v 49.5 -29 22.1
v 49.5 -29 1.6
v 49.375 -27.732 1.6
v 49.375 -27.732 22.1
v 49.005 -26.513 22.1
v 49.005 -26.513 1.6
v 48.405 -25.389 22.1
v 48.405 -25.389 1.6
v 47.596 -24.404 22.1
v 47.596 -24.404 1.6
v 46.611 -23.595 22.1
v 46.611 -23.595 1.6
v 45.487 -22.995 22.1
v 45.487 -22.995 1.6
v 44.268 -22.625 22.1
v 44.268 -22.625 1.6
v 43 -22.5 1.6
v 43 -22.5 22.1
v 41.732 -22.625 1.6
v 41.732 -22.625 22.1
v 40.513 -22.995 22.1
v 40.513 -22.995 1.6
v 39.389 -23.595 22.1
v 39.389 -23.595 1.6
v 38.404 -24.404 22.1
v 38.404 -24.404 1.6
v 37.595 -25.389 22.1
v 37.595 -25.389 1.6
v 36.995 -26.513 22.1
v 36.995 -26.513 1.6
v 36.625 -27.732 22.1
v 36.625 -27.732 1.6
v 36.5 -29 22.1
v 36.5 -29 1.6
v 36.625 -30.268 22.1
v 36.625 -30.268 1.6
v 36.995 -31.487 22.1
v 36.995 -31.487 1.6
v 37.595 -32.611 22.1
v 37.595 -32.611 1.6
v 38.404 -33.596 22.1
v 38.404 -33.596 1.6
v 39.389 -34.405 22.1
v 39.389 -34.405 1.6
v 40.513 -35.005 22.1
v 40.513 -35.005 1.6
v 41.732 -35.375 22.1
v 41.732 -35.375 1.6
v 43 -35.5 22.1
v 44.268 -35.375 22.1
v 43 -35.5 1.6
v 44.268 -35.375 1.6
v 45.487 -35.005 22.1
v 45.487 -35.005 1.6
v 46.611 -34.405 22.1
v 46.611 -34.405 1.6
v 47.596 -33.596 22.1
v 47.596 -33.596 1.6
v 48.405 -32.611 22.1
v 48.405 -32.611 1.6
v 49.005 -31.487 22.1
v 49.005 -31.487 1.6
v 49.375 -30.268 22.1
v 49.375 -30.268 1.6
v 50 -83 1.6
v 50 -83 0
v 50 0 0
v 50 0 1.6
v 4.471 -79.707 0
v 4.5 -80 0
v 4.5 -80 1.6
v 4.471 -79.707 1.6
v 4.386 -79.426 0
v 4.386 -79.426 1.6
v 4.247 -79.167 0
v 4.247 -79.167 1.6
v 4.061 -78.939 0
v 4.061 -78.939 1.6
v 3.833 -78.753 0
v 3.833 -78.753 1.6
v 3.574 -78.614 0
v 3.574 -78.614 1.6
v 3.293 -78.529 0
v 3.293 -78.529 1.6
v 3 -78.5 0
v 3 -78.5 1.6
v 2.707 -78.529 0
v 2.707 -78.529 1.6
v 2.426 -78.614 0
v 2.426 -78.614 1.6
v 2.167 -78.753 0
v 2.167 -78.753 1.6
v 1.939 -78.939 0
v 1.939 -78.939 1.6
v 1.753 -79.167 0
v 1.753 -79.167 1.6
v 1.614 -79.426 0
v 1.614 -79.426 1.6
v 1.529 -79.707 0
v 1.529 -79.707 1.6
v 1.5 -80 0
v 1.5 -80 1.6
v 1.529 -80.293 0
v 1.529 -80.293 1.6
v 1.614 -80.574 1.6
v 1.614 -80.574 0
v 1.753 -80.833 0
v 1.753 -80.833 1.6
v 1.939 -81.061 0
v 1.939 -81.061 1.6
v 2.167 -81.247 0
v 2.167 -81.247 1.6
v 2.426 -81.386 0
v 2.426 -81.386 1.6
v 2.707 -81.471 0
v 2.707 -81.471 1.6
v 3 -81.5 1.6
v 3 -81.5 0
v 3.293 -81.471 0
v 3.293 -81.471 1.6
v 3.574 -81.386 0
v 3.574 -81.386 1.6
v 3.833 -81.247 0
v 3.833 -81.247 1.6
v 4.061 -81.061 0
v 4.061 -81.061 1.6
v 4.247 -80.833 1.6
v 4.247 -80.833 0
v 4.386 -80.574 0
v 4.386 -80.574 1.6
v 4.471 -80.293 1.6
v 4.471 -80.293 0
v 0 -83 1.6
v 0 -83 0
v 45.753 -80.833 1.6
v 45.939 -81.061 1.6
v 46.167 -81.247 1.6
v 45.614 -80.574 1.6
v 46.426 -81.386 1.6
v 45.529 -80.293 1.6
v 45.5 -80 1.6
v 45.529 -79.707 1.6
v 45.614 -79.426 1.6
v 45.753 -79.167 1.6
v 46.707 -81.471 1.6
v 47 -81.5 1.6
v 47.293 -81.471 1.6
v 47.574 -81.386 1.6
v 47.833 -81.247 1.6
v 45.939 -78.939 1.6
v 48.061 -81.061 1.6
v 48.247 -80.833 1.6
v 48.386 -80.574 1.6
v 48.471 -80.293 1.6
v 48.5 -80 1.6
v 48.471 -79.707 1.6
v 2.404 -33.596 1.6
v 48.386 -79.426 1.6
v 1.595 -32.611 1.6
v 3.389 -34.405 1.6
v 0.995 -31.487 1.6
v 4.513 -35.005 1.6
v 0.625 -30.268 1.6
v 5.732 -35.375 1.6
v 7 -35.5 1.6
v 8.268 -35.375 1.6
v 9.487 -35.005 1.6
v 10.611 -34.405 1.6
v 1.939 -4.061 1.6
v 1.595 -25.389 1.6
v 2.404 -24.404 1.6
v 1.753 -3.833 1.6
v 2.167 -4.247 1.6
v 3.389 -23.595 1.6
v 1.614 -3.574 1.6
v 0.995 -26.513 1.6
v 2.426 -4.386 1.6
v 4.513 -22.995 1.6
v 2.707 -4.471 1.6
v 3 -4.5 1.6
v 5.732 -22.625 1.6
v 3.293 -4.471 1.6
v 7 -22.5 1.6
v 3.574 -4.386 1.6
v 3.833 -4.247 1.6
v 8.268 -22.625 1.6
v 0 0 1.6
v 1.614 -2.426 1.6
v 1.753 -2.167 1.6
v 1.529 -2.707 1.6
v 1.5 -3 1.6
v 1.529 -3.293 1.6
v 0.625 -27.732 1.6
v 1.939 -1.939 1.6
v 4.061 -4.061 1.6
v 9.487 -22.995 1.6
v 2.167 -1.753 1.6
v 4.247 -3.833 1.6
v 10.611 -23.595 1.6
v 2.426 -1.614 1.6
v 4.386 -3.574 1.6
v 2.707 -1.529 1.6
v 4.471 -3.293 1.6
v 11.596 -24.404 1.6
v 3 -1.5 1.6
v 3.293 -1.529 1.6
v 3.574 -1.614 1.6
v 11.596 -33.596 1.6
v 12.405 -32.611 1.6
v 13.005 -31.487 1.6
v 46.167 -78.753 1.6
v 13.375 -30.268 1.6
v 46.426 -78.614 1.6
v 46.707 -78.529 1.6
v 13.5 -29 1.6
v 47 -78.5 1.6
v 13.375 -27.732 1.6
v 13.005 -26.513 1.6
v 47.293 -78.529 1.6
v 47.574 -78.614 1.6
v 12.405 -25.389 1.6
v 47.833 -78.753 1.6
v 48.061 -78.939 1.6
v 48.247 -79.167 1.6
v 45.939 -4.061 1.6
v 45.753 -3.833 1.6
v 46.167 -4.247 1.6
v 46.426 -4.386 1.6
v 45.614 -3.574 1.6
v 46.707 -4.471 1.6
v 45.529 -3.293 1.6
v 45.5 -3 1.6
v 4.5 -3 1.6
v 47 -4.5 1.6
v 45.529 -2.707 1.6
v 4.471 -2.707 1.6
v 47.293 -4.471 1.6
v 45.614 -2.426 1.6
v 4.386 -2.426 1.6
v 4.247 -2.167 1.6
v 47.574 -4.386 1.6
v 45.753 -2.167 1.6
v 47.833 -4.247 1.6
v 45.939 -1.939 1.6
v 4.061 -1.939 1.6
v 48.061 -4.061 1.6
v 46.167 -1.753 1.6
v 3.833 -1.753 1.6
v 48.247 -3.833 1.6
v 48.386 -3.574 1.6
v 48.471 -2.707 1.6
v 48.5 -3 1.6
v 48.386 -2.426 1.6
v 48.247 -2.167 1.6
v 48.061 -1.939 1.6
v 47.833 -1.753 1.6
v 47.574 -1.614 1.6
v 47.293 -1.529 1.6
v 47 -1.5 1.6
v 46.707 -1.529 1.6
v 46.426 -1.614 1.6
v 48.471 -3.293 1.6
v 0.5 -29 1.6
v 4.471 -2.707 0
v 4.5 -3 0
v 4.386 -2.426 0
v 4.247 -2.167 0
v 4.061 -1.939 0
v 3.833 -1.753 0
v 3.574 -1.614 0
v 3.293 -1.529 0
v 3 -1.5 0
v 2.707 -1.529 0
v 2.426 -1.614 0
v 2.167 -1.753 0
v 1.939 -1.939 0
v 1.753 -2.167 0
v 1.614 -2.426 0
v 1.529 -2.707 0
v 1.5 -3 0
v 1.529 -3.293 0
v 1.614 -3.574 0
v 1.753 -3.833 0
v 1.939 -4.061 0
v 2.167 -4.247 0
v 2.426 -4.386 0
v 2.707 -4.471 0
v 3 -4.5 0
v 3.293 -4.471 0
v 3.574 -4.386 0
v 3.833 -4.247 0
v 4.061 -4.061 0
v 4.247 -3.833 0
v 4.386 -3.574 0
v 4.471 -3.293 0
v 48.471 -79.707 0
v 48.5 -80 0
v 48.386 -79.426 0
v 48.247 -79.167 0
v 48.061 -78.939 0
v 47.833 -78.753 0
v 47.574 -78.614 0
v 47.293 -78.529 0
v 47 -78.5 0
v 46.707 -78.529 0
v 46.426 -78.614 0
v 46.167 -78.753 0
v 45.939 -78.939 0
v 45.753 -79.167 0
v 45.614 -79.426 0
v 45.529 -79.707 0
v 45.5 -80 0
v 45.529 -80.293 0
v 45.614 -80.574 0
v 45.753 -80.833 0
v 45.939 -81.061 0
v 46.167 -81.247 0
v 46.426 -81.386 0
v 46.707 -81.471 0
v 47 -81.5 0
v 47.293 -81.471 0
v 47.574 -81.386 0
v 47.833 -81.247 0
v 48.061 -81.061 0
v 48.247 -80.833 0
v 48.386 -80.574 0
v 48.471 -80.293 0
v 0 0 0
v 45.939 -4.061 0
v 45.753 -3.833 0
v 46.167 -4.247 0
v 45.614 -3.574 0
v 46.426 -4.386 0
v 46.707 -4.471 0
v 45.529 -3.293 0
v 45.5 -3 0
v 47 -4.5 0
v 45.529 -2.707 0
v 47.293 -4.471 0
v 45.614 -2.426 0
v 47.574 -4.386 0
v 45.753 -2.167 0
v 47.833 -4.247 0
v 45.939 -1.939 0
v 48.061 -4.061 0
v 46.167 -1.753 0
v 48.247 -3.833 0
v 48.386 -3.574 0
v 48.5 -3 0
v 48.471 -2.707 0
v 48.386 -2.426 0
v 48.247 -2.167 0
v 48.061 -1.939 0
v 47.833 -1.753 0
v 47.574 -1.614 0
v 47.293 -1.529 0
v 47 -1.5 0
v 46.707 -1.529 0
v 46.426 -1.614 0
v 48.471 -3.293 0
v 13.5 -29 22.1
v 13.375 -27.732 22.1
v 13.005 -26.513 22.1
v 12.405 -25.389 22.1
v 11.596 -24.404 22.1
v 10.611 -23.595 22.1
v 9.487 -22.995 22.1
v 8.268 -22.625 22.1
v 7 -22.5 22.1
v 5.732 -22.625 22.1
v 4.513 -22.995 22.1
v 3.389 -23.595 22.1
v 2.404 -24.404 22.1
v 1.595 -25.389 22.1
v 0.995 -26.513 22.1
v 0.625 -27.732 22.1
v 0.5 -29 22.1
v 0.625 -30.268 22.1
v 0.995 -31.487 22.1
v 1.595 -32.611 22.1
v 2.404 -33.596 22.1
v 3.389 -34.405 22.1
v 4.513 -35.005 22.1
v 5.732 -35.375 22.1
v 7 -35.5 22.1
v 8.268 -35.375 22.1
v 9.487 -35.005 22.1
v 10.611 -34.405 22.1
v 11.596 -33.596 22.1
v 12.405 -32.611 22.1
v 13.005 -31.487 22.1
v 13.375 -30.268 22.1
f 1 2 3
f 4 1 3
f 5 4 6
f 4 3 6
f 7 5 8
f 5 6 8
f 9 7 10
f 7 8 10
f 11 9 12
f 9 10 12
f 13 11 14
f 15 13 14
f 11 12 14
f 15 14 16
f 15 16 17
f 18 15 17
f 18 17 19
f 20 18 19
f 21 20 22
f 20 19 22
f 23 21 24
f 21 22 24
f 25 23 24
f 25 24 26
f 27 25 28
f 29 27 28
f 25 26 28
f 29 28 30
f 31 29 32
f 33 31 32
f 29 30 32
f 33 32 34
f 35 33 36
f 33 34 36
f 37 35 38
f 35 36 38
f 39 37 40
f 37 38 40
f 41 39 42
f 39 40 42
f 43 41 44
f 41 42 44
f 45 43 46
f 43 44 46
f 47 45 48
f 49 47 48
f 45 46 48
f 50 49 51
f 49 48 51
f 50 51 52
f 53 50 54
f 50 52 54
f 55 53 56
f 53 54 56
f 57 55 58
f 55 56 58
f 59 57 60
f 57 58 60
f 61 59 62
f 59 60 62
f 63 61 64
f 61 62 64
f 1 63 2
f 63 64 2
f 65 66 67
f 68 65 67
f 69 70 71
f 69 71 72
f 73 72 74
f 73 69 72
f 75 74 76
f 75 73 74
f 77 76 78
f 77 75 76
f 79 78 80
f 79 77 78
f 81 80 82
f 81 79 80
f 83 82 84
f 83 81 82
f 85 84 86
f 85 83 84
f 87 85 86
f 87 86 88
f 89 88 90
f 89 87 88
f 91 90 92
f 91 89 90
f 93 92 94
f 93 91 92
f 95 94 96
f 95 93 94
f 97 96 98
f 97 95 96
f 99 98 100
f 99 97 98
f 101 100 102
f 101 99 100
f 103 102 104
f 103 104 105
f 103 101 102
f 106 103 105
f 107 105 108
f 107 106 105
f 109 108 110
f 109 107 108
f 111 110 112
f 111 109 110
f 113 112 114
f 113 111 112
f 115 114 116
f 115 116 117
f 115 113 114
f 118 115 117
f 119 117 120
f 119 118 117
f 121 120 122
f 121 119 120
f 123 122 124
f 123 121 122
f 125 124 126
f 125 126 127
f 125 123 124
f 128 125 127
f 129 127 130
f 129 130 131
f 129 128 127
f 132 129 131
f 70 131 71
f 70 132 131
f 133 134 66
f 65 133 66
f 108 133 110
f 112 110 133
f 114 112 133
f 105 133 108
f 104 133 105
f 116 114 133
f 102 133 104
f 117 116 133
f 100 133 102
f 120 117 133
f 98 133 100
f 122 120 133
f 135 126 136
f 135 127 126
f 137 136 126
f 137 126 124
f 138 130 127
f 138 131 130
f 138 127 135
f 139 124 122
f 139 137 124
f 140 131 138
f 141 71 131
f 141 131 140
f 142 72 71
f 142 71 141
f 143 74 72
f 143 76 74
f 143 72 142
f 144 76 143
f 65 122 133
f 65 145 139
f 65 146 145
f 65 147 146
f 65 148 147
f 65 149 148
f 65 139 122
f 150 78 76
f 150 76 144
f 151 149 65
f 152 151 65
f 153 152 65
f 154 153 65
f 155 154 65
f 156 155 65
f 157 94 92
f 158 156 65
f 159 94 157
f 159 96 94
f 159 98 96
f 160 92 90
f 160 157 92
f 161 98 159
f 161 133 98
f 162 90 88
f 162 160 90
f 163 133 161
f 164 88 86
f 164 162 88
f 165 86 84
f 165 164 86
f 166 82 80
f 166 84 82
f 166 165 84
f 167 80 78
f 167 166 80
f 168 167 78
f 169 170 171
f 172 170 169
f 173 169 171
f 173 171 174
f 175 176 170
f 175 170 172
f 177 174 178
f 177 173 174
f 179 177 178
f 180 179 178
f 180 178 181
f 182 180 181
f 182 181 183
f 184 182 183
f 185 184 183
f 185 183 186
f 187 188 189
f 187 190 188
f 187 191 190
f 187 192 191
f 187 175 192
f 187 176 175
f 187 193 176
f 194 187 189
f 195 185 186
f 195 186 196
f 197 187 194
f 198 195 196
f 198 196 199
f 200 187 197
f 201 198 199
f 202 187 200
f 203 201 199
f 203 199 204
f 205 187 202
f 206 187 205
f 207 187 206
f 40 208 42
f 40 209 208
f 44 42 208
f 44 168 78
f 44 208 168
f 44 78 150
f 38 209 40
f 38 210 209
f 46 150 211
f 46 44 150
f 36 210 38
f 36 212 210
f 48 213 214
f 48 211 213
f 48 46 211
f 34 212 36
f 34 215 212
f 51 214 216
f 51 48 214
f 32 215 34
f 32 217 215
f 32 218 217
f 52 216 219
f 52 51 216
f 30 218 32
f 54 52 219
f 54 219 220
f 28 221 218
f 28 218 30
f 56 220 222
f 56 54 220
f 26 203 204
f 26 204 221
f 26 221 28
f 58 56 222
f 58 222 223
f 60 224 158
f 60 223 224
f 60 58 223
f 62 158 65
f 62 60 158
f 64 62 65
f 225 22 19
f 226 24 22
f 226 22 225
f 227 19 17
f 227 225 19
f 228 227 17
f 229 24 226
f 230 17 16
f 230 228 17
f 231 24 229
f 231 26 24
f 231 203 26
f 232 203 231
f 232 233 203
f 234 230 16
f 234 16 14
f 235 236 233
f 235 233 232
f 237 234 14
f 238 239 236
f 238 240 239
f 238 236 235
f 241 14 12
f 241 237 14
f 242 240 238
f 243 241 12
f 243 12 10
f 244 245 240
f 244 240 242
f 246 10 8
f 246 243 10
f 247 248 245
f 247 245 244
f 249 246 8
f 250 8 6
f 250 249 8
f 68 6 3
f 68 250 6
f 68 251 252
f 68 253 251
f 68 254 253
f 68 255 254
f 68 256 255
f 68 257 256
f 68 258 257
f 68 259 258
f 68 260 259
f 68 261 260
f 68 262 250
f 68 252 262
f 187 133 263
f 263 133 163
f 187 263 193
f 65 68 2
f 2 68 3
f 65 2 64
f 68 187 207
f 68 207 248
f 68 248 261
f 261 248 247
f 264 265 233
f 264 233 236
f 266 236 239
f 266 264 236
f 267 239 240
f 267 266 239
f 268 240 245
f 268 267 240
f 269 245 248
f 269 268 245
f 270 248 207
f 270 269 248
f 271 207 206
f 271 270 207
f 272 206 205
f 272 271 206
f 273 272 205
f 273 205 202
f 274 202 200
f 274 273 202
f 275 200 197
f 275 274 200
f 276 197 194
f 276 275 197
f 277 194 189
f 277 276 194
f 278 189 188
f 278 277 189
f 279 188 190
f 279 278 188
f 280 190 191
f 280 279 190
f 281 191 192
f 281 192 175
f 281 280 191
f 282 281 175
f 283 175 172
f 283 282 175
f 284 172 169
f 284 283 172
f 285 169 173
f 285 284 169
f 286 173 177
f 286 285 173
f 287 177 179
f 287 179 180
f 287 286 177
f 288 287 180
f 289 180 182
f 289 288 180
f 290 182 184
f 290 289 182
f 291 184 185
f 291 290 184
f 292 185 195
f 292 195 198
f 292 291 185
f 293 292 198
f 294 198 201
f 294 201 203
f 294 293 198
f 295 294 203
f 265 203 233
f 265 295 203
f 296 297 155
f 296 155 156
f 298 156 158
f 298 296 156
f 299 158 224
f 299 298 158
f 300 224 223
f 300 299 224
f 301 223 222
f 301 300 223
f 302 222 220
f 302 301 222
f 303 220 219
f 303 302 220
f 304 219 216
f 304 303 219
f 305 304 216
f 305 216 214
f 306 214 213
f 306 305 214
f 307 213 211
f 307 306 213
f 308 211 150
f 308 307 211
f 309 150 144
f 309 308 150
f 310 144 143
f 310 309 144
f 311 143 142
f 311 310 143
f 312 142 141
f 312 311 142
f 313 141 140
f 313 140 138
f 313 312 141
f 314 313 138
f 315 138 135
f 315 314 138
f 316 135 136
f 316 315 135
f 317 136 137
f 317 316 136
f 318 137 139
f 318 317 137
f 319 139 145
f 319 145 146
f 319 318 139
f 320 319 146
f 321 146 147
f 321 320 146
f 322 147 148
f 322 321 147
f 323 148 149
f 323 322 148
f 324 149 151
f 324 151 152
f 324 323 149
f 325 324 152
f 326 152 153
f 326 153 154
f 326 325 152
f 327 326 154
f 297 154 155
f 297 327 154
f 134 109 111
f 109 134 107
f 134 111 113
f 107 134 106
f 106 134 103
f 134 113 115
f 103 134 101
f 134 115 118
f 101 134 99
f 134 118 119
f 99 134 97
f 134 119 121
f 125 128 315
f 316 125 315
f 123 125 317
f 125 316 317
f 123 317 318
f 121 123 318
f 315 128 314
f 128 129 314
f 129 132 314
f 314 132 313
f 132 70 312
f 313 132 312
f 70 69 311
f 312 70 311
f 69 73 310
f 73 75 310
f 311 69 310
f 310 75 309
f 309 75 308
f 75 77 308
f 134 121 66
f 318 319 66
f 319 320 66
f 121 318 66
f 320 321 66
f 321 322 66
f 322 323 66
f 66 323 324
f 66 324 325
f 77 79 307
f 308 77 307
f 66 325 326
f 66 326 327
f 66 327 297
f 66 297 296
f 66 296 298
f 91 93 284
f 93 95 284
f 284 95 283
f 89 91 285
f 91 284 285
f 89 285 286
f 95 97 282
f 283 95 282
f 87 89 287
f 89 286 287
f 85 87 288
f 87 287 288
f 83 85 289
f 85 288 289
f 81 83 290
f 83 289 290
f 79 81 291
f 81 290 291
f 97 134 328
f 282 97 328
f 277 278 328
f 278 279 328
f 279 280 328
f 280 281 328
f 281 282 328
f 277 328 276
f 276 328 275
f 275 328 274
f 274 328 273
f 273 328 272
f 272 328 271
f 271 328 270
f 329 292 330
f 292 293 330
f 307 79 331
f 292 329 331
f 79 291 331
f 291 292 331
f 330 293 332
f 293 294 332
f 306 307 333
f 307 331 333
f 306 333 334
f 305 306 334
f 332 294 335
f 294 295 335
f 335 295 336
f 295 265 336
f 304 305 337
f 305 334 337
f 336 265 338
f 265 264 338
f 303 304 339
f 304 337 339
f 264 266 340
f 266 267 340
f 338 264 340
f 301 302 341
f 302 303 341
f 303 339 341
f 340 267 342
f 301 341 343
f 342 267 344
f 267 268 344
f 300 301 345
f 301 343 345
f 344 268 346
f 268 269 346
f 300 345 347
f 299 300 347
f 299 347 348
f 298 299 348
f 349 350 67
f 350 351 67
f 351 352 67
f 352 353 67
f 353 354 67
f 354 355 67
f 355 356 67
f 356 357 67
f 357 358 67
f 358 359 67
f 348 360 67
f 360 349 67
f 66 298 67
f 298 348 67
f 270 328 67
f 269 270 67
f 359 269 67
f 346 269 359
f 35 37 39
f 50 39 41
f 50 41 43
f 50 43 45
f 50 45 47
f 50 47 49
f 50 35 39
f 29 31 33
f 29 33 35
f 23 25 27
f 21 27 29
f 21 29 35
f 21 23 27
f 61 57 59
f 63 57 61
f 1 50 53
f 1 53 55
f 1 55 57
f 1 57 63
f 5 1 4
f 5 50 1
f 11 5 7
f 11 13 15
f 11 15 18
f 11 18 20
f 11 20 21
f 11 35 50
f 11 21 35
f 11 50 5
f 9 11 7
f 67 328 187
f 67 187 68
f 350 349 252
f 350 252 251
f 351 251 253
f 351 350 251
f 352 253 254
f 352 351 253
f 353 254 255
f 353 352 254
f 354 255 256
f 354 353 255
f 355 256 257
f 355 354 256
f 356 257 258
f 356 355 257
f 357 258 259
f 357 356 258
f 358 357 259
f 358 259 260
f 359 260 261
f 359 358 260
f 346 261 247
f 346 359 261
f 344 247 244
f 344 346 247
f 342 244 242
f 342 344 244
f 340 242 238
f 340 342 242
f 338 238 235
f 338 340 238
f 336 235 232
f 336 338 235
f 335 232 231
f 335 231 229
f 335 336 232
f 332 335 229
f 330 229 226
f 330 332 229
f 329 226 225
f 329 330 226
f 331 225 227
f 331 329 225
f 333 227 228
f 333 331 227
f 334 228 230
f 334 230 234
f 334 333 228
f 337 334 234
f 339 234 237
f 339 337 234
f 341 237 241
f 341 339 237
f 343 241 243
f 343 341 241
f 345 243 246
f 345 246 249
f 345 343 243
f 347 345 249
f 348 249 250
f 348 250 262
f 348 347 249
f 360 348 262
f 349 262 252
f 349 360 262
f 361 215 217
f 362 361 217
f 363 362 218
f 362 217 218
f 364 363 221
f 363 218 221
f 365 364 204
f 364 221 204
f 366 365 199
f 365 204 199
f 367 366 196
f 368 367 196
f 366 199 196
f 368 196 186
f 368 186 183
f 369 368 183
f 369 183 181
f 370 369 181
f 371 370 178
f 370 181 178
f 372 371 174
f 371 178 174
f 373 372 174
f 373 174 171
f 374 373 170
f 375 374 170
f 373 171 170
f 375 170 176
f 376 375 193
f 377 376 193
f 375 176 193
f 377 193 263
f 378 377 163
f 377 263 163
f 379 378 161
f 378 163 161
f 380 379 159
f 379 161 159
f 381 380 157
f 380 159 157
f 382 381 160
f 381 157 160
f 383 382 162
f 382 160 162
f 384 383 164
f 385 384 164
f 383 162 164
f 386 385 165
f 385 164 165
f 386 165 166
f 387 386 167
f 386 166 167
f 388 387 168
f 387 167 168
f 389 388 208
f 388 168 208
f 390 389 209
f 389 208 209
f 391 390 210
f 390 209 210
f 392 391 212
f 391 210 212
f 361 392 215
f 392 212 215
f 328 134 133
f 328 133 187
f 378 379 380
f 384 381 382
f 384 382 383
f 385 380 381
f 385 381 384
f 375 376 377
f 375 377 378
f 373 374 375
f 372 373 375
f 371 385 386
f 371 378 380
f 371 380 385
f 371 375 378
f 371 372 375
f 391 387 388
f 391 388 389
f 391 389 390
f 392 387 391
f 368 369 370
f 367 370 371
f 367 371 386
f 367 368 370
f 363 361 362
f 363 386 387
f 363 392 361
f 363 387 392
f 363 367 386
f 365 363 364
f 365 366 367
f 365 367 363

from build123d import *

# Parameters (mm, degrees)
ESQUISSE1_W        = 50
ESQUISSE1_H        = 83
ESQUISSE1_R        = 1.5
BOSS_EXTRU_1_DEPTH = 1.6
ESQUISSE2_R        = 6.5
BOSS_EXTRU_2_DEPTH = 20.5


with BuildPart() as part:
    # Esquisse1 → Boss.-Extru.1 (new body)
    with BuildSketch(Plane.XY):
        with Locations((25, -41.5)):
            Rectangle(ESQUISSE1_W, ESQUISSE1_H)
        with Locations((3, -3)):
            Circle(ESQUISSE1_R, mode=Mode.SUBTRACT)
        with Locations((47, -3)):
            Circle(ESQUISSE1_R, mode=Mode.SUBTRACT)
        with Locations((47, -80)):
            Circle(ESQUISSE1_R, mode=Mode.SUBTRACT)
        with Locations((3, -80)):
            Circle(ESQUISSE1_R, mode=Mode.SUBTRACT)
    extrude(amount=BOSS_EXTRU_1_DEPTH)

    # Esquisse2 → Boss.-Extru.2 (add)
    with BuildSketch(Plane.XY.offset(1.6)):
        with Locations((7, -29)):
            Circle(ESQUISSE2_R)
        with Locations((43, -29)):
            Circle(ESQUISSE2_R)
    extrude(amount=BOSS_EXTRU_2_DEPTH)


solid = part.part
